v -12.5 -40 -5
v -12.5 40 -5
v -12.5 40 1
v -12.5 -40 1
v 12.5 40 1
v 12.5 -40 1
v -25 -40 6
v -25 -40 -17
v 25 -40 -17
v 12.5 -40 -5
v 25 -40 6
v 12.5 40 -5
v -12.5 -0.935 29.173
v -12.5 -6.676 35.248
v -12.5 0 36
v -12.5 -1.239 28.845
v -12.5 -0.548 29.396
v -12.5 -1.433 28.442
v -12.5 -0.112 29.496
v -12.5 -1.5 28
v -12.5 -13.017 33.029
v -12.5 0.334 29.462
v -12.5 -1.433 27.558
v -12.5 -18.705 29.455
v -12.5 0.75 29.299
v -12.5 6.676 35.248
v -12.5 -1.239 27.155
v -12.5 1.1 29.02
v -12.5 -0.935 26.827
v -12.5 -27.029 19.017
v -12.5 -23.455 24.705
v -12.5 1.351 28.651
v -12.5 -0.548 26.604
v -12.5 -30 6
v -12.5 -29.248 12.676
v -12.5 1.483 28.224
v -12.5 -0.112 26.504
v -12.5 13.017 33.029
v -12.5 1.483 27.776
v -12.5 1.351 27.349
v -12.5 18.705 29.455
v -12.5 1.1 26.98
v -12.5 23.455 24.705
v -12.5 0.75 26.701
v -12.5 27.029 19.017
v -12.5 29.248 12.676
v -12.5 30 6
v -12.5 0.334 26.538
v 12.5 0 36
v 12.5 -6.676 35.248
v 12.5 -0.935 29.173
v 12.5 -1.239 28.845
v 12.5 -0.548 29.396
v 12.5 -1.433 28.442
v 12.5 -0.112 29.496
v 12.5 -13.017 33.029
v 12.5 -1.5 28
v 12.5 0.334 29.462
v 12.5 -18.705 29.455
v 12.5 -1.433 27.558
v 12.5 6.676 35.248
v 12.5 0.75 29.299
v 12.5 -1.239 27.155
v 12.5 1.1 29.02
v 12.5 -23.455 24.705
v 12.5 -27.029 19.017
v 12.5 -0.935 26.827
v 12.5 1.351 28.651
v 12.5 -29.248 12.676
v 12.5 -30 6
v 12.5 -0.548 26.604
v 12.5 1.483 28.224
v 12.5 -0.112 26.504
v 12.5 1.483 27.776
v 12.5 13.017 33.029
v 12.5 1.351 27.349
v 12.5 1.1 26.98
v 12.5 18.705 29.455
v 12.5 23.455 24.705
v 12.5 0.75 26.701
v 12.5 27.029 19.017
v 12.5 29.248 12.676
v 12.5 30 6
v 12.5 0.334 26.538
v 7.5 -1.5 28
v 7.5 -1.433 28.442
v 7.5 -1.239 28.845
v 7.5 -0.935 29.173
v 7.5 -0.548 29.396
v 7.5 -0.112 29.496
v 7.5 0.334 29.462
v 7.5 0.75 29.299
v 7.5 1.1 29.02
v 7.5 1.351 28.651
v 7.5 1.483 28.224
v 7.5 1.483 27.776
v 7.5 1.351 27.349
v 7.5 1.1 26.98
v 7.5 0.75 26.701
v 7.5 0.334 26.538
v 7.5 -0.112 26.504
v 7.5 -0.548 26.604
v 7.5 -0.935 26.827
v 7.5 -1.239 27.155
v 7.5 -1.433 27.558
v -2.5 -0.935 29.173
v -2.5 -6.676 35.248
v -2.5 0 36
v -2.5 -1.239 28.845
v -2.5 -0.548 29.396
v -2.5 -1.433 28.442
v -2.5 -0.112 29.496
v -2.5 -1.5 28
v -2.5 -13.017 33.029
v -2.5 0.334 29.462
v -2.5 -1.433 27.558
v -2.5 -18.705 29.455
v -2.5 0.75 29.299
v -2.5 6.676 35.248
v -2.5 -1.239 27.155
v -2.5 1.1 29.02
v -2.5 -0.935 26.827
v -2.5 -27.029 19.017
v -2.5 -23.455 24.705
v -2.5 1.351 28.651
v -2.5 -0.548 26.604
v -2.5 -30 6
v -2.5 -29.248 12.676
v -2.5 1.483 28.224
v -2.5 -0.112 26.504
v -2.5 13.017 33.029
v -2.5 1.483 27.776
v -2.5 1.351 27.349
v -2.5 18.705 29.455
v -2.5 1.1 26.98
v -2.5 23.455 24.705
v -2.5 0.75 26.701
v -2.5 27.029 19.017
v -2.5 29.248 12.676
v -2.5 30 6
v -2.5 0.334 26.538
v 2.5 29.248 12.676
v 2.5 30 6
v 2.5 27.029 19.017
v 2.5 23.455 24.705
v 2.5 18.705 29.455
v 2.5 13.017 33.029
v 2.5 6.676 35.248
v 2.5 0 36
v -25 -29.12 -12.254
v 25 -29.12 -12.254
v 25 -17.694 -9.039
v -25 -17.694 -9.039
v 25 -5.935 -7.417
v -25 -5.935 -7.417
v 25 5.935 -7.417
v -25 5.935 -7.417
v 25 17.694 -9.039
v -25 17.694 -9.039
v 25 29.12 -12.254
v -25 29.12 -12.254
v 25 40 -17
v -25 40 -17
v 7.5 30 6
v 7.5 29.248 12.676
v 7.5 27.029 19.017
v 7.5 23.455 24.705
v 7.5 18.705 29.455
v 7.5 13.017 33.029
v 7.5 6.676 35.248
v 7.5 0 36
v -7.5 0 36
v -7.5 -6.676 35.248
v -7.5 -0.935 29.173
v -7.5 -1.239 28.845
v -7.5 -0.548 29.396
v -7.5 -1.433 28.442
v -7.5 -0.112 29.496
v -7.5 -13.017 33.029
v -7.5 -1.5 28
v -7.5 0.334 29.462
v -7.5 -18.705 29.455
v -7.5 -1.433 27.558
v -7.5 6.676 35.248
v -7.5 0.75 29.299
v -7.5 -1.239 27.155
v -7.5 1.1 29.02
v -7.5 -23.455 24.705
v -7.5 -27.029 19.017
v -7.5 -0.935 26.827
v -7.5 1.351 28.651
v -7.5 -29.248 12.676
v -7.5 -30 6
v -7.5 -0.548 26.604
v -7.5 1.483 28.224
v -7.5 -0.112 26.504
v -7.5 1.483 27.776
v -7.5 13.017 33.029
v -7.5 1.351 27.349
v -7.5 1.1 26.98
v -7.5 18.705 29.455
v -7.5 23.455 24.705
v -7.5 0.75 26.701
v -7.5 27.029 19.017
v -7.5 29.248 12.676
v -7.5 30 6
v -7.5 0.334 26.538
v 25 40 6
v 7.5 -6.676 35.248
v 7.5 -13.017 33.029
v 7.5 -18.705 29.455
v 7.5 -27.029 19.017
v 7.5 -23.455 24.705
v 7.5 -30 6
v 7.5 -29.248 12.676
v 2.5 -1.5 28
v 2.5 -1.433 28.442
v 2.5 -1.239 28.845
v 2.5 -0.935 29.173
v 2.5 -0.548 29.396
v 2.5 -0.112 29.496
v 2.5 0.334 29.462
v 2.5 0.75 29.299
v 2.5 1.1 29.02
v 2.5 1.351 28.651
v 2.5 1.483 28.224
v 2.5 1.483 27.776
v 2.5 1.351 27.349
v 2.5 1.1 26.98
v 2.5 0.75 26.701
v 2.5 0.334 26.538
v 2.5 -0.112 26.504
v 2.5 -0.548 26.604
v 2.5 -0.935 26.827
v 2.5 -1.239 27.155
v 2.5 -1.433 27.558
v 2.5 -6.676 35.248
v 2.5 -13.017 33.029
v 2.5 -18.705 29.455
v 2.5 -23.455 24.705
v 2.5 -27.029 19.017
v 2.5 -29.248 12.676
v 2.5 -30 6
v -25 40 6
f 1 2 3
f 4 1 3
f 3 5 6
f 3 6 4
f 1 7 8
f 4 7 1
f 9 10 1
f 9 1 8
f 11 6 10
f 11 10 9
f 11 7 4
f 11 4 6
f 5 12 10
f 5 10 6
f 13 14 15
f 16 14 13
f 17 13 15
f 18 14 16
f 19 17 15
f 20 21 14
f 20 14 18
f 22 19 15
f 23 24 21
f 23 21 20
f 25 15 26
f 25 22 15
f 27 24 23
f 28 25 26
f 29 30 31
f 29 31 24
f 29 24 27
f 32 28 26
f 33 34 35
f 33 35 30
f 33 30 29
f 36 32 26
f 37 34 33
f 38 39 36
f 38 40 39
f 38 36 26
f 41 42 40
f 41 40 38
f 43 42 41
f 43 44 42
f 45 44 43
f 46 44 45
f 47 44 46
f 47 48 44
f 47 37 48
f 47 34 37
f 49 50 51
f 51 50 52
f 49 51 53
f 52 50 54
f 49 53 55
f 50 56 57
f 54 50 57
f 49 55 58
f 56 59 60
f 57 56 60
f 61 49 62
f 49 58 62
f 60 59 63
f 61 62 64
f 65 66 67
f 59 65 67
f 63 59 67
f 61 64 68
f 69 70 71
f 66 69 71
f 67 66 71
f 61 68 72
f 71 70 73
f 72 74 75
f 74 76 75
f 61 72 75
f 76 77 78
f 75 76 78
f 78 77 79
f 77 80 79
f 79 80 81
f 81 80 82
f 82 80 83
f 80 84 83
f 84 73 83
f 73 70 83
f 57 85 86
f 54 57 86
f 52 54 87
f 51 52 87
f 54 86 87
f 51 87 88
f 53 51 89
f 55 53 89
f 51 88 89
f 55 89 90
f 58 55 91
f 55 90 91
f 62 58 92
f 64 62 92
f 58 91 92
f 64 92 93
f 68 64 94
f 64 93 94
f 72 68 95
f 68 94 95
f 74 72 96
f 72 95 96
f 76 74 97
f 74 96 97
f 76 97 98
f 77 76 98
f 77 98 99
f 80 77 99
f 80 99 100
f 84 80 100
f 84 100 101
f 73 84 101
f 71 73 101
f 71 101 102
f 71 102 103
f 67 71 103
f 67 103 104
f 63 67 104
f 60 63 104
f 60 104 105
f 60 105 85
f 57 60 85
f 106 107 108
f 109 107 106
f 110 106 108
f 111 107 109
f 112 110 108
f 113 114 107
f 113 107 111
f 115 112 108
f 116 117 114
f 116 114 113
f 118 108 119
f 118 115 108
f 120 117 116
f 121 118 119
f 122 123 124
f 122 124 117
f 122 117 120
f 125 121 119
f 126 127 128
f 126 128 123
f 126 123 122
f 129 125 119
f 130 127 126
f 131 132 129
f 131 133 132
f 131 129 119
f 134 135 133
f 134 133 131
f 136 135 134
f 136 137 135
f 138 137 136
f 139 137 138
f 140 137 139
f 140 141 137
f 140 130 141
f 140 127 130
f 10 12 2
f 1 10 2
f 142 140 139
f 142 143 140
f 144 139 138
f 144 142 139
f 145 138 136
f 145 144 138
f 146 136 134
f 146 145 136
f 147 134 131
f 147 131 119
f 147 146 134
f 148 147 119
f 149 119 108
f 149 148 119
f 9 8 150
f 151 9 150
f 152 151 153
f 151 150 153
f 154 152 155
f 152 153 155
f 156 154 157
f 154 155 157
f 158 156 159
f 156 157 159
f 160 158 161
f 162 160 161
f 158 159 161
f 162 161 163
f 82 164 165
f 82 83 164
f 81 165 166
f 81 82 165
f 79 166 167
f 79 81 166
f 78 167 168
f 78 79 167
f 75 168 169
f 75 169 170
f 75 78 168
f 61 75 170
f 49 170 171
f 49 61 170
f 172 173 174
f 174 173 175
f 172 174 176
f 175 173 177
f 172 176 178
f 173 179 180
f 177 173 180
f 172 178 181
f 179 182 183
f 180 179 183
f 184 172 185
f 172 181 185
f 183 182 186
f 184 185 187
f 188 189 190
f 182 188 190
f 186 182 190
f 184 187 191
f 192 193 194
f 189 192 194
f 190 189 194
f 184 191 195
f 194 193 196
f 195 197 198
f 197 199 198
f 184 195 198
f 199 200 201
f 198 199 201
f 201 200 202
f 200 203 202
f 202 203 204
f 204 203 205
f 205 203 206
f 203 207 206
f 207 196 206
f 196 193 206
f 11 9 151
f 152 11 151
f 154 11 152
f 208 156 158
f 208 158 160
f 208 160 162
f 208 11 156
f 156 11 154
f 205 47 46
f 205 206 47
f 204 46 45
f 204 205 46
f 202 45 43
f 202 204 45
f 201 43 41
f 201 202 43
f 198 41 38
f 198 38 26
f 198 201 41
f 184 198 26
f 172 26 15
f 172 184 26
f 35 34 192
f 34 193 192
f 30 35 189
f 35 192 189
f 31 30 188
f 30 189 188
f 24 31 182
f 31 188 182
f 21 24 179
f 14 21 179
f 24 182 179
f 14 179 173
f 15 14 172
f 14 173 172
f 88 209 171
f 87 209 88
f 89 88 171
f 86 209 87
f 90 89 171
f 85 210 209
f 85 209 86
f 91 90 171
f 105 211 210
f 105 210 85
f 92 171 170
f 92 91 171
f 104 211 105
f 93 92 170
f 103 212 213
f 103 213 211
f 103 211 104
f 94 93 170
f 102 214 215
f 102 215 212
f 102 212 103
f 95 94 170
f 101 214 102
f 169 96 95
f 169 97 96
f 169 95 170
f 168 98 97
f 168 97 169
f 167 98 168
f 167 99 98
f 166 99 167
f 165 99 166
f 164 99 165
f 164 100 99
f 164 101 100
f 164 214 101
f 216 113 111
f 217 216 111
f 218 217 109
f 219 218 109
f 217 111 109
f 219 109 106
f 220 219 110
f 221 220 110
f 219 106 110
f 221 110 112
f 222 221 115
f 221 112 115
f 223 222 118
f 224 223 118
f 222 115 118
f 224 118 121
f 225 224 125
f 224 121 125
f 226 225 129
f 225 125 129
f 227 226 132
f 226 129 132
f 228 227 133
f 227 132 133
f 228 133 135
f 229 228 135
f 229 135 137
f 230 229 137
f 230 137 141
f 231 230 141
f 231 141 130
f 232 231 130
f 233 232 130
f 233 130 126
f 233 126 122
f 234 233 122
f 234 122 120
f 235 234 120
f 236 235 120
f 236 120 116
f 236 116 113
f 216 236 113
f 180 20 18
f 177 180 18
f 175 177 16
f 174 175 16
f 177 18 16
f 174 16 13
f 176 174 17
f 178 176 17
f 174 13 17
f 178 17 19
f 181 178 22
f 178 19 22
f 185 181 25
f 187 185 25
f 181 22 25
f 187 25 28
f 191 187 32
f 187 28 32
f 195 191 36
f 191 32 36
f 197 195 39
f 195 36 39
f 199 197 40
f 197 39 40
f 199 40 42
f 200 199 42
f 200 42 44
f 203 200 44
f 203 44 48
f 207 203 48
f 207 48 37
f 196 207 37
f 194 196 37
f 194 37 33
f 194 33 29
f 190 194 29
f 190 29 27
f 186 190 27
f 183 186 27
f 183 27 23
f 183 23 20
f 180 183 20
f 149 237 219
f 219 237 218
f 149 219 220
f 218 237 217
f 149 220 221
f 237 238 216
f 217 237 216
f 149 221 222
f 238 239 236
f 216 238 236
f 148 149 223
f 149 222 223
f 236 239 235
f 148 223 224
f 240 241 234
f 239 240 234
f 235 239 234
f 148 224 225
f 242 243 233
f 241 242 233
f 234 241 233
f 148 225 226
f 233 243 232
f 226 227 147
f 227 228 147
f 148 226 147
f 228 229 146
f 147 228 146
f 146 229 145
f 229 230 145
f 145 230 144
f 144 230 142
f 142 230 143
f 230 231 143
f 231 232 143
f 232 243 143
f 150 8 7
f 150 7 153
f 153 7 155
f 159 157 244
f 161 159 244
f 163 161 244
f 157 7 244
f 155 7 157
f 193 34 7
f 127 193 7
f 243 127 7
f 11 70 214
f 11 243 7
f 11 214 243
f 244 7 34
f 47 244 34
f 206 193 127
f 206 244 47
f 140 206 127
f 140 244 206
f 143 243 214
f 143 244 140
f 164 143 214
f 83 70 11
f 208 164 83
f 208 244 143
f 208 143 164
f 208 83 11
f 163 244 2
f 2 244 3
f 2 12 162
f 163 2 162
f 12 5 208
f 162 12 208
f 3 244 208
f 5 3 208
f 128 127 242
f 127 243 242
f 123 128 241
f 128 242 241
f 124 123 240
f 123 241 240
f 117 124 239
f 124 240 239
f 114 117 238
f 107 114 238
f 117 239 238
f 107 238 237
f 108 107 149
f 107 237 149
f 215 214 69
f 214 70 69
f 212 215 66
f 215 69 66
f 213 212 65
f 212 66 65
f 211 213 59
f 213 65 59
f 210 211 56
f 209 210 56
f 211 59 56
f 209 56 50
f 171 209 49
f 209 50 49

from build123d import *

# Parameters (mm, degrees)
F0_W      = 50
F0_H      = 80
F1_DEPTH  = 6
F2_W      = 5
F2_H      = 60
F3_DEPTH  = 30
F4_R      = 29.99999
F5_DEPTH  = 40
F7_DEPTH  = 65
F8_W      = 25
F8_H      = 6
F9_DEPTH  = 115.9
F10_R     = 1.5
F11_DEPTH = 30.7


# Not quite as in the source:
# - a fillet or chamfer is up to 0.001 mm smaller than in the source, because OpenCascade refuses the exact size


with BuildPart() as f1:
    # F0 (on Top) → F1 (new body)
    with BuildSketch(Plane.XY):
        Rectangle(F0_W, F0_H)
    extrude(amount=F1_DEPTH)

    # F2 (on face) → F3 (join)
    with BuildSketch(Plane.XY.offset(6)):
        Rectangle(F2_W, F2_H)
        with Locations((-10, 0)):
            Rectangle(F2_W, F2_H)
        with Locations((10, 0)):
            Rectangle(F2_W, F2_H)
    extrude(amount=F3_DEPTH)

    # F4 (radius 30 in the source; OpenCascade refuses exactly that, so slightly less here)
    f4_edges = [f1.edges().sort_by_distance(p)[0] for p in [
        (10, 30, 36),
        (0, 30, 36),
        (-10, 30, 36),
        (-10, -30, 36),
        (0, -30, 36),
        (10, -30, 36),
    ]]
    fillet(f4_edges, radius=F4_R)

    # F5 (add): a face of the model
    f5_faces = [f1.faces().sort_by_distance(p)[0] for p in [
        (0, 0, 0),
    ]]
    extrude(f5_faces, amount=F5_DEPTH)

    # F6 (on face) → F7 (cut)
    with BuildSketch(Plane(origin=(-25, 0, 0), x_dir=(0, -1, 0), z_dir=(-1, 0, 0))):
        with BuildLine():
            Line((40, -40), (40, -17))
            ThreePointArc((40, -17), (0, -7.2132285382), (-40, -17))
            Line((-40, -17), (-40, -40))
            Line((-40, -40), (40, -40))
        make_face()
    extrude(amount=-F7_DEPTH, mode=Mode.SUBTRACT)

    # F8 (on face) → F9 (cut)
    with BuildSketch(Plane(origin=(0, 40, 0), x_dir=(-1, 0, 0), z_dir=(0, 1, 0))):
        with Locations((0, -2)):
            Rectangle(F8_W, F8_H)
    extrude(amount=-F9_DEPTH, mode=Mode.SUBTRACT)

    # F10 (on face) → F11 (cut)
    with BuildSketch(Plane(origin=(-12.5, 0, 0), x_dir=(0, -1, 0), z_dir=(-1, 0, 0))):
        with Locations((0, 28)):
            Circle(F10_R)
    extrude(amount=-F11_DEPTH, mode=Mode.SUBTRACT)


solid = f1.part
